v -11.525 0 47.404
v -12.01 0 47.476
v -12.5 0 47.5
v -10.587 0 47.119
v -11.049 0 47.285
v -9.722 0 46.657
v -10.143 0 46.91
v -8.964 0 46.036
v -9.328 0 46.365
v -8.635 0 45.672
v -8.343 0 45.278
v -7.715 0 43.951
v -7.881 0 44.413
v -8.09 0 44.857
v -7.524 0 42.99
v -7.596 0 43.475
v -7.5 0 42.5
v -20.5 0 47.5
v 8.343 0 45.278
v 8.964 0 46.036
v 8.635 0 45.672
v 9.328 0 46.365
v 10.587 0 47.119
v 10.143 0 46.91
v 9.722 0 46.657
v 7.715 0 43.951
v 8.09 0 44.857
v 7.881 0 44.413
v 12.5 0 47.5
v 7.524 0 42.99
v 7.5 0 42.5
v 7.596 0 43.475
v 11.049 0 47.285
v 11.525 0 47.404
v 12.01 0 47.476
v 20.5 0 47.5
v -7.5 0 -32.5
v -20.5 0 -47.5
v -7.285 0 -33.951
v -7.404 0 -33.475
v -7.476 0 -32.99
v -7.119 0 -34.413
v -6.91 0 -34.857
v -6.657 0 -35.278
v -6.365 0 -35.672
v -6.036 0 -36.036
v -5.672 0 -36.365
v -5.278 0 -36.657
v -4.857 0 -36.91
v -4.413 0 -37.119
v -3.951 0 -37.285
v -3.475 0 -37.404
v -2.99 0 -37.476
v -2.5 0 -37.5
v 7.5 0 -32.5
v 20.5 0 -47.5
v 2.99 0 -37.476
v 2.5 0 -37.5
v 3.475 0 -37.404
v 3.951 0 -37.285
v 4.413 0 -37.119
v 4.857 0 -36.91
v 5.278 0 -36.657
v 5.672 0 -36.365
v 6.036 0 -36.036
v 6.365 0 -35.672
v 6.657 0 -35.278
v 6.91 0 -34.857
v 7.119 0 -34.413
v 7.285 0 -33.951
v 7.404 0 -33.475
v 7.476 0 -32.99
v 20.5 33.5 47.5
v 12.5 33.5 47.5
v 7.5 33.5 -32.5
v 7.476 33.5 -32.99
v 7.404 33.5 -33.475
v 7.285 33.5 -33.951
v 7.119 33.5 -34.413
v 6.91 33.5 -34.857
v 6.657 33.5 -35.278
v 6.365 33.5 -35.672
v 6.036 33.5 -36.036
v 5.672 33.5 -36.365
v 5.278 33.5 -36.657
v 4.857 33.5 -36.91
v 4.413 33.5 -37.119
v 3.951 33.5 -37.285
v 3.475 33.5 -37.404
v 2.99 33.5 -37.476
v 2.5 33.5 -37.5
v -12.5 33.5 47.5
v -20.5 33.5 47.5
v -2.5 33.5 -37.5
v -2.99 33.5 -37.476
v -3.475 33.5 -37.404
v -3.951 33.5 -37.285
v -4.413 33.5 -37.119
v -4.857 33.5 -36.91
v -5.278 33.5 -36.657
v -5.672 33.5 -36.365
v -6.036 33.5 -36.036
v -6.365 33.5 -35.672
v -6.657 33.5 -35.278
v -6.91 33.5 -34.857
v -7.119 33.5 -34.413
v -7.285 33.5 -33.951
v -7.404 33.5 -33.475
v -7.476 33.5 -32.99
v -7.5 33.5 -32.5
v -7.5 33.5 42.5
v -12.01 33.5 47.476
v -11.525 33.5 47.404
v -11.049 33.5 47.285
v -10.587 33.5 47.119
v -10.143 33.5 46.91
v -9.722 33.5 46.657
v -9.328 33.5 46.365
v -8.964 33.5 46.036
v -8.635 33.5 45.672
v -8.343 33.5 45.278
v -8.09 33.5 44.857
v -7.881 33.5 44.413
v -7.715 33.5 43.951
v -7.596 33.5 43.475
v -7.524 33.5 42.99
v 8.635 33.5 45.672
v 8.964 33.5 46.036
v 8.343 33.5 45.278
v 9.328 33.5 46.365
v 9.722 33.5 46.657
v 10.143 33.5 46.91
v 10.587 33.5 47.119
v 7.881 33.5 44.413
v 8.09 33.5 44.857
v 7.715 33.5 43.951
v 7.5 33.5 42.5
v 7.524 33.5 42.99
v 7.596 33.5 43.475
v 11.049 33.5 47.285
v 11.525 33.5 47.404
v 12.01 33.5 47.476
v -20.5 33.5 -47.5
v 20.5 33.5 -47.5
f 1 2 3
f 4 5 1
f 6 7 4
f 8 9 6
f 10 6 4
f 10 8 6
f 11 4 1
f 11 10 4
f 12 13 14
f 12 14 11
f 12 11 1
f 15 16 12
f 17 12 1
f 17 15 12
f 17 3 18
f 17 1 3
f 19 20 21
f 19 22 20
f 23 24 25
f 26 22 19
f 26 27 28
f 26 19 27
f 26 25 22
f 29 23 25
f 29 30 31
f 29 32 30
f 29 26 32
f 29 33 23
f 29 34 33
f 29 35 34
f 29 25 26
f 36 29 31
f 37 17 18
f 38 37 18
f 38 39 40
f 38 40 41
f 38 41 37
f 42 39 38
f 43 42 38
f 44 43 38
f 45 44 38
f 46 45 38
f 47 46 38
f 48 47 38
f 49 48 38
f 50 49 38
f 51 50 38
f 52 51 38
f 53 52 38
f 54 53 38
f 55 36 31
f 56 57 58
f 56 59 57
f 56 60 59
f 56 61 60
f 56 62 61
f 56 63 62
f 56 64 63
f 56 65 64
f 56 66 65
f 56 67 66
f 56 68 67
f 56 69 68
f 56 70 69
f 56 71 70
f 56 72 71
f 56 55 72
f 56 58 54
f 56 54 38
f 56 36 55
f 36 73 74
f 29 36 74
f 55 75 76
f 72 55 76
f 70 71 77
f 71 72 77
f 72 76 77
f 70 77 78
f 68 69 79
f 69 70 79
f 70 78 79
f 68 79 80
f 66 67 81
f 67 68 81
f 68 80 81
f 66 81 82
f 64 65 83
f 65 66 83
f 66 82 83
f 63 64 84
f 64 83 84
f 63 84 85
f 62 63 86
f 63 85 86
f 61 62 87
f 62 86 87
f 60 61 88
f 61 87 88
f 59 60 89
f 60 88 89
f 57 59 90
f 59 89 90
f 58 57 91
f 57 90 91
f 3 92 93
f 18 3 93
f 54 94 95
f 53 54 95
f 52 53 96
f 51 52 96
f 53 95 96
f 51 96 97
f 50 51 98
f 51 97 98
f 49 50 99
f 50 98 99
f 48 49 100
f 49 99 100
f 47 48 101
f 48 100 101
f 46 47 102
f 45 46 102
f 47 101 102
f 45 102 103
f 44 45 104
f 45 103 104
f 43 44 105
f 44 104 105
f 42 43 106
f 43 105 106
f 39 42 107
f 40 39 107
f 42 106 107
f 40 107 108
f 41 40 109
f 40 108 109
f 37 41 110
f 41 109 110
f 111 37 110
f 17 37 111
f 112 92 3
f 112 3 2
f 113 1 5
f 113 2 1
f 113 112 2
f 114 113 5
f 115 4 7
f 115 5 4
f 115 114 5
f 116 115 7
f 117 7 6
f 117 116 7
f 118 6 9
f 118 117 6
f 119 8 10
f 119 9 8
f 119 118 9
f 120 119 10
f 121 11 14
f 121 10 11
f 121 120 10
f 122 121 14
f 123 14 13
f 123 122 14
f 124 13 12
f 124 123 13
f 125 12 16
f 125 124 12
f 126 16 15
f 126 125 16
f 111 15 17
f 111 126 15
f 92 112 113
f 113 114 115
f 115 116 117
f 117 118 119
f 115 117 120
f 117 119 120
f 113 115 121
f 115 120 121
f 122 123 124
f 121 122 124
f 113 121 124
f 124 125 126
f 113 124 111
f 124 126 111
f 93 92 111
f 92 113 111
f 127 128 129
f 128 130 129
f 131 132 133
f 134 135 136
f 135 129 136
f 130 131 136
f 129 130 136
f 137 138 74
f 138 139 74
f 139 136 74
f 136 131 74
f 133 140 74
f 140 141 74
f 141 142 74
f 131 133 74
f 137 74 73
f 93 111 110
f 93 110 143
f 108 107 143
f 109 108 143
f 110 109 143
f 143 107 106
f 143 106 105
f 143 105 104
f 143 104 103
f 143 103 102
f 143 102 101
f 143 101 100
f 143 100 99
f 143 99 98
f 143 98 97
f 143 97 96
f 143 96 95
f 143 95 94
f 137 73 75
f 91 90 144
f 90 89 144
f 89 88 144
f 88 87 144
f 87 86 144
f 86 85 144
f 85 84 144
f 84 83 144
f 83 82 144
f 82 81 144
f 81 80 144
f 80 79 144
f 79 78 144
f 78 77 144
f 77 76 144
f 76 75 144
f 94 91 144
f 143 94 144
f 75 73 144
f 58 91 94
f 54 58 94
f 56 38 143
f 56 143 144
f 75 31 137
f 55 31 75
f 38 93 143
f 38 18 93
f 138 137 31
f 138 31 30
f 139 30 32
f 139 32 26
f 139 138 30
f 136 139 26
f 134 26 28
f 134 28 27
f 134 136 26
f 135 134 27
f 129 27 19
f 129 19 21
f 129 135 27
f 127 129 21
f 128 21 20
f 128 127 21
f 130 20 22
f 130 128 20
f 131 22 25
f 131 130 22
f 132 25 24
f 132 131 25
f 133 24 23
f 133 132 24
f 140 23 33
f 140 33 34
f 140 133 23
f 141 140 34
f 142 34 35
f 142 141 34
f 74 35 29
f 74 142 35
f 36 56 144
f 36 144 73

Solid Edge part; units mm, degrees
sketch "Sketch1" plane through (0, 0, 0) normal (0, -1, 0) x (1, 0, 0)
  line L0 (7.5, -37.5) -> (-7.5, -37.5)
  line L1 (-7.5, -37.5) -> (-7.5, 47.5)
  line L2 (-7.5, 47.5) -> (-20.5, 47.5)
  line L3 (-20.5, 47.5) -> (-20.5, -47.5)
  line L4 (-20.5, -47.5) -> (20.5, -47.5)
  line L5 (20.5, -47.5) -> (20.5, 47.5)
  line L6 (20.5, 47.5) -> (7.5, 47.5)
  line L7 (7.5, 47.5) -> (7.5, -37.5)
extrude "Protrusion1" add sketch "Sketch1" against normal blind 33.5
fillet "Round1" radius 5 2 edges at (7.5, 16.75, -37.5) (-7.5, 16.75, -37.5)
fillet "Round2" radius 5 2 edges at (7.5, 16.75, 47.5) (-7.5, 16.75, 47.5)
